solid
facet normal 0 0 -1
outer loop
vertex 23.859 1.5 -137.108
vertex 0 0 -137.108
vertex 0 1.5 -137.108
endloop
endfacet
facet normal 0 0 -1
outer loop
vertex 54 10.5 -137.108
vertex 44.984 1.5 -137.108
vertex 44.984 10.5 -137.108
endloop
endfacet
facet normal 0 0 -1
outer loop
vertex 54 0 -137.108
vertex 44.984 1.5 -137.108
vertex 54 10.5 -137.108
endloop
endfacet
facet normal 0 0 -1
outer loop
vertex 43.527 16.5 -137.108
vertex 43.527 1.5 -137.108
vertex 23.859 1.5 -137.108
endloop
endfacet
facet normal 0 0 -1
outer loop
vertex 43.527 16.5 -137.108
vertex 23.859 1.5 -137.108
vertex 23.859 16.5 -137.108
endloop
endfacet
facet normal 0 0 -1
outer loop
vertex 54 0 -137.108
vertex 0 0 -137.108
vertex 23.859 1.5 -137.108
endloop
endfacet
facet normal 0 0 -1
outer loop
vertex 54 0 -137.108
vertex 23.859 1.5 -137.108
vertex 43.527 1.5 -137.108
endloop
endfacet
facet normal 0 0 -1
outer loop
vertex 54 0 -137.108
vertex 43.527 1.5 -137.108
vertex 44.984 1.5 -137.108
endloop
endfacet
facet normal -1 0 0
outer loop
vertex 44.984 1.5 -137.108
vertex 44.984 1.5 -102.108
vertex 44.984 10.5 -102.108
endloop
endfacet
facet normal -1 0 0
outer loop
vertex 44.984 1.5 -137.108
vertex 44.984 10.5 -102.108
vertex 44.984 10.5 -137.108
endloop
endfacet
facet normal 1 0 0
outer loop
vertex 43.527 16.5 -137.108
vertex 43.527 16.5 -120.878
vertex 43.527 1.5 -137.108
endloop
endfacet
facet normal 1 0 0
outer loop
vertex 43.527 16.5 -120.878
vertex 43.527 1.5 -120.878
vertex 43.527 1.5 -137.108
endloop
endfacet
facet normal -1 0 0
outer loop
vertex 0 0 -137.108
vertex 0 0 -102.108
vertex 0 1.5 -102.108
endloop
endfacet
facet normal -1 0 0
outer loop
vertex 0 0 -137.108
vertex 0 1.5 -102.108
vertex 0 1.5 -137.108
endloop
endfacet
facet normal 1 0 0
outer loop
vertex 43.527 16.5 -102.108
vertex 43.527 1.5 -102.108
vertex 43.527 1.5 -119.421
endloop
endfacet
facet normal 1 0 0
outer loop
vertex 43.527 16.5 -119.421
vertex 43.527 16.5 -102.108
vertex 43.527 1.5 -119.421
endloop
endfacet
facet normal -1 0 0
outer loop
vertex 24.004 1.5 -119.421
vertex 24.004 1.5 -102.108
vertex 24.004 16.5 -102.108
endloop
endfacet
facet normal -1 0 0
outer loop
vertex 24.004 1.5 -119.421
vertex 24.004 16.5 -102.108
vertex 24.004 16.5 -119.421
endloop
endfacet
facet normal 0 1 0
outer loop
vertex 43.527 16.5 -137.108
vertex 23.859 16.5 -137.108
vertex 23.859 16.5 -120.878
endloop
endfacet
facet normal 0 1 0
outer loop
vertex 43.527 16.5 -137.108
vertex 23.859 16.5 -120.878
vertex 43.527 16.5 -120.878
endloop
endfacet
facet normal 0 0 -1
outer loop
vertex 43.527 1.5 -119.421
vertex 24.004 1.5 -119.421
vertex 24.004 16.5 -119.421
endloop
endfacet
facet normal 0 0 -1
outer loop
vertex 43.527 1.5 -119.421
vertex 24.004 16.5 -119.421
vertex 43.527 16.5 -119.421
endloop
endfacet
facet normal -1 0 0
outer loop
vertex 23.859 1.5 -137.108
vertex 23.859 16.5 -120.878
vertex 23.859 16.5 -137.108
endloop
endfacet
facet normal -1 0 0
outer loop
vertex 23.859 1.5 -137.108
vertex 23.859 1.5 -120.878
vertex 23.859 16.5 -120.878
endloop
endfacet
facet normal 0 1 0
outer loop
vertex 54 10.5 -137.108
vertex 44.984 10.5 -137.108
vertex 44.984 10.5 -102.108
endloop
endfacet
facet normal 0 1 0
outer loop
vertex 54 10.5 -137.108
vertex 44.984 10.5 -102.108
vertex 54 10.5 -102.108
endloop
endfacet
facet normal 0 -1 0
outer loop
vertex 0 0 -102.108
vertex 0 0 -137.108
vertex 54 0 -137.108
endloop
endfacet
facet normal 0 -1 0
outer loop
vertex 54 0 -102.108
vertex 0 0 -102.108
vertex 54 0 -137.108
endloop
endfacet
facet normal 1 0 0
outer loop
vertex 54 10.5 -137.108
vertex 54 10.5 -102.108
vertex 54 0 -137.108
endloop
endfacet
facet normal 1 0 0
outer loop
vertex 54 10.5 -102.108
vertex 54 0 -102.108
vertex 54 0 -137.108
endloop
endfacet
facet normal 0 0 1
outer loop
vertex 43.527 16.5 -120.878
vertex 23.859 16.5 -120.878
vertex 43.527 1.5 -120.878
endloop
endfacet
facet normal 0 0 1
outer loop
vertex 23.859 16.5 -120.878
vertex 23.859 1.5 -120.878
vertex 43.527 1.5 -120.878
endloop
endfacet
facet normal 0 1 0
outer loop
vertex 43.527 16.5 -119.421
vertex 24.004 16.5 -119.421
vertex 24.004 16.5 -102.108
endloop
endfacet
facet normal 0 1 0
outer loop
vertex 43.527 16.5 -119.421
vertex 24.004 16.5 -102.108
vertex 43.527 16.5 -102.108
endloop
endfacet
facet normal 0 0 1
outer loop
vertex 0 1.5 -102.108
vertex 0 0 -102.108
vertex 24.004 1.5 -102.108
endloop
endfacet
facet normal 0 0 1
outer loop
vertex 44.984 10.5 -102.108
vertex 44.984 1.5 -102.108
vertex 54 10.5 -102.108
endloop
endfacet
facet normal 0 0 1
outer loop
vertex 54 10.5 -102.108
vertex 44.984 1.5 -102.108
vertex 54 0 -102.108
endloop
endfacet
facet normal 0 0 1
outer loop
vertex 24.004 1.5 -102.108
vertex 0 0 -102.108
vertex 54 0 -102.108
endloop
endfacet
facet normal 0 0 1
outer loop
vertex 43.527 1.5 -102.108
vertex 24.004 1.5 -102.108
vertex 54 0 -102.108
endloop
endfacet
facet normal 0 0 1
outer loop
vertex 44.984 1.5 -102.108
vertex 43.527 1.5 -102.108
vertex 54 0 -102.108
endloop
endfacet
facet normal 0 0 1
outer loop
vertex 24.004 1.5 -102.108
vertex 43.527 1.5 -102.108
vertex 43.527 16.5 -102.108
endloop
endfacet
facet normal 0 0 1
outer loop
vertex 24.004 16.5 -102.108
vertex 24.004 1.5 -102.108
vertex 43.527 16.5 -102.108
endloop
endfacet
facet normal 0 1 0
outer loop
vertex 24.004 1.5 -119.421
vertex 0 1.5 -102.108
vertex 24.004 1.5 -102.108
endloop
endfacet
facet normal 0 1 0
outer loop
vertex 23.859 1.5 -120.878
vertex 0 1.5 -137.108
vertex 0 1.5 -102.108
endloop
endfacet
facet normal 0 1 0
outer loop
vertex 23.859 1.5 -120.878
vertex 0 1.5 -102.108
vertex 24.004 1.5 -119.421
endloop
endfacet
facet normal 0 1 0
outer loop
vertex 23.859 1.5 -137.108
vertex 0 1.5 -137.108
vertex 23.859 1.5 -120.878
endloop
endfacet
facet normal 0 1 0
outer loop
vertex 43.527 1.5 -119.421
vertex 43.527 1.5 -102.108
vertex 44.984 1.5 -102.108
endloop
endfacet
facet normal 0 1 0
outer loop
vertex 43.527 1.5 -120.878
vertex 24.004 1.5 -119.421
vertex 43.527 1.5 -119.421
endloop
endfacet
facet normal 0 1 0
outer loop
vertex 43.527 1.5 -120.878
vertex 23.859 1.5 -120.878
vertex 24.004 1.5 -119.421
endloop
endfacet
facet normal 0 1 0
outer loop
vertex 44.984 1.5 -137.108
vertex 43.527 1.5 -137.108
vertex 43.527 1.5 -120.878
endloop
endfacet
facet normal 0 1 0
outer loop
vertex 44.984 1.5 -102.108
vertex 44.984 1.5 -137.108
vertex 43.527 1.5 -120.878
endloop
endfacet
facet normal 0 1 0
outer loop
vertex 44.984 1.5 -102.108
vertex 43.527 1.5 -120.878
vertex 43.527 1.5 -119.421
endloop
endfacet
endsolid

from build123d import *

# Parameters (mm, degrees)
SKETCH_1_W      = 54
SKETCH_1_H      = 35
EXTRUDE_1_DEPTH = 1.5
SKETCH_2_W      = 9.016092248
SKETCH_2_H      = 35
SKETCH_2_W_2    = 19.66831863
SKETCH_2_H_2    = 16.230096049
SKETCH_2_W_3    = 19.52262738
SKETCH_2_H_3    = 17.31299146
EXTRUDE_2_DEPTH = 9
SKETCH_3_W      = 19.66831863
SKETCH_3_H      = 16.230096049
SKETCH_3_W_2    = 19.52262738
SKETCH_3_H_2    = 17.31299146
EXTRUDE_3_DEPTH = 6


with BuildPart() as part:
    # 草图1 → 凸台-拉伸1 (new body)
    with BuildSketch(Plane(origin=(0, 0, 0), x_dir=(1, 0, 0), z_dir=(0, 1, 0))):
        with Locations((27, 119.607926306)):
            Rectangle(SKETCH_1_W, SKETCH_1_H)
    extrude(amount=EXTRUDE_1_DEPTH)

    # 草图2 → 凸台-拉伸2 (add)
    with BuildSketch(Plane(origin=(0, 1.5, 0), x_dir=(1, 0, 0), z_dir=(0, 1, 0))):
        with Locations((49.491953876, 119.607926306)):
            Rectangle(SKETCH_2_W, SKETCH_2_H)
        with Locations((33.692835946, 128.992878281)):
            Rectangle(SKETCH_2_W_2, SKETCH_2_H_2)
        with Locations((33.765681571, 110.764422036)):
            Rectangle(SKETCH_2_W_3, SKETCH_2_H_3)
    extrude(amount=EXTRUDE_2_DEPTH)

    # 草图3 → 凸台-拉伸3 (add)
    with BuildSketch(Plane(origin=(0, 10.5, 0), x_dir=(1, 0, 0), z_dir=(0, 1, 0))):
        with Locations((33.692835946, 128.992878281)):
            Rectangle(SKETCH_3_W, SKETCH_3_H)
        with Locations((33.765681571, 110.764422036)):
            Rectangle(SKETCH_3_W_2, SKETCH_3_H_2)
    extrude(amount=EXTRUDE_3_DEPTH)


solid = part.part
